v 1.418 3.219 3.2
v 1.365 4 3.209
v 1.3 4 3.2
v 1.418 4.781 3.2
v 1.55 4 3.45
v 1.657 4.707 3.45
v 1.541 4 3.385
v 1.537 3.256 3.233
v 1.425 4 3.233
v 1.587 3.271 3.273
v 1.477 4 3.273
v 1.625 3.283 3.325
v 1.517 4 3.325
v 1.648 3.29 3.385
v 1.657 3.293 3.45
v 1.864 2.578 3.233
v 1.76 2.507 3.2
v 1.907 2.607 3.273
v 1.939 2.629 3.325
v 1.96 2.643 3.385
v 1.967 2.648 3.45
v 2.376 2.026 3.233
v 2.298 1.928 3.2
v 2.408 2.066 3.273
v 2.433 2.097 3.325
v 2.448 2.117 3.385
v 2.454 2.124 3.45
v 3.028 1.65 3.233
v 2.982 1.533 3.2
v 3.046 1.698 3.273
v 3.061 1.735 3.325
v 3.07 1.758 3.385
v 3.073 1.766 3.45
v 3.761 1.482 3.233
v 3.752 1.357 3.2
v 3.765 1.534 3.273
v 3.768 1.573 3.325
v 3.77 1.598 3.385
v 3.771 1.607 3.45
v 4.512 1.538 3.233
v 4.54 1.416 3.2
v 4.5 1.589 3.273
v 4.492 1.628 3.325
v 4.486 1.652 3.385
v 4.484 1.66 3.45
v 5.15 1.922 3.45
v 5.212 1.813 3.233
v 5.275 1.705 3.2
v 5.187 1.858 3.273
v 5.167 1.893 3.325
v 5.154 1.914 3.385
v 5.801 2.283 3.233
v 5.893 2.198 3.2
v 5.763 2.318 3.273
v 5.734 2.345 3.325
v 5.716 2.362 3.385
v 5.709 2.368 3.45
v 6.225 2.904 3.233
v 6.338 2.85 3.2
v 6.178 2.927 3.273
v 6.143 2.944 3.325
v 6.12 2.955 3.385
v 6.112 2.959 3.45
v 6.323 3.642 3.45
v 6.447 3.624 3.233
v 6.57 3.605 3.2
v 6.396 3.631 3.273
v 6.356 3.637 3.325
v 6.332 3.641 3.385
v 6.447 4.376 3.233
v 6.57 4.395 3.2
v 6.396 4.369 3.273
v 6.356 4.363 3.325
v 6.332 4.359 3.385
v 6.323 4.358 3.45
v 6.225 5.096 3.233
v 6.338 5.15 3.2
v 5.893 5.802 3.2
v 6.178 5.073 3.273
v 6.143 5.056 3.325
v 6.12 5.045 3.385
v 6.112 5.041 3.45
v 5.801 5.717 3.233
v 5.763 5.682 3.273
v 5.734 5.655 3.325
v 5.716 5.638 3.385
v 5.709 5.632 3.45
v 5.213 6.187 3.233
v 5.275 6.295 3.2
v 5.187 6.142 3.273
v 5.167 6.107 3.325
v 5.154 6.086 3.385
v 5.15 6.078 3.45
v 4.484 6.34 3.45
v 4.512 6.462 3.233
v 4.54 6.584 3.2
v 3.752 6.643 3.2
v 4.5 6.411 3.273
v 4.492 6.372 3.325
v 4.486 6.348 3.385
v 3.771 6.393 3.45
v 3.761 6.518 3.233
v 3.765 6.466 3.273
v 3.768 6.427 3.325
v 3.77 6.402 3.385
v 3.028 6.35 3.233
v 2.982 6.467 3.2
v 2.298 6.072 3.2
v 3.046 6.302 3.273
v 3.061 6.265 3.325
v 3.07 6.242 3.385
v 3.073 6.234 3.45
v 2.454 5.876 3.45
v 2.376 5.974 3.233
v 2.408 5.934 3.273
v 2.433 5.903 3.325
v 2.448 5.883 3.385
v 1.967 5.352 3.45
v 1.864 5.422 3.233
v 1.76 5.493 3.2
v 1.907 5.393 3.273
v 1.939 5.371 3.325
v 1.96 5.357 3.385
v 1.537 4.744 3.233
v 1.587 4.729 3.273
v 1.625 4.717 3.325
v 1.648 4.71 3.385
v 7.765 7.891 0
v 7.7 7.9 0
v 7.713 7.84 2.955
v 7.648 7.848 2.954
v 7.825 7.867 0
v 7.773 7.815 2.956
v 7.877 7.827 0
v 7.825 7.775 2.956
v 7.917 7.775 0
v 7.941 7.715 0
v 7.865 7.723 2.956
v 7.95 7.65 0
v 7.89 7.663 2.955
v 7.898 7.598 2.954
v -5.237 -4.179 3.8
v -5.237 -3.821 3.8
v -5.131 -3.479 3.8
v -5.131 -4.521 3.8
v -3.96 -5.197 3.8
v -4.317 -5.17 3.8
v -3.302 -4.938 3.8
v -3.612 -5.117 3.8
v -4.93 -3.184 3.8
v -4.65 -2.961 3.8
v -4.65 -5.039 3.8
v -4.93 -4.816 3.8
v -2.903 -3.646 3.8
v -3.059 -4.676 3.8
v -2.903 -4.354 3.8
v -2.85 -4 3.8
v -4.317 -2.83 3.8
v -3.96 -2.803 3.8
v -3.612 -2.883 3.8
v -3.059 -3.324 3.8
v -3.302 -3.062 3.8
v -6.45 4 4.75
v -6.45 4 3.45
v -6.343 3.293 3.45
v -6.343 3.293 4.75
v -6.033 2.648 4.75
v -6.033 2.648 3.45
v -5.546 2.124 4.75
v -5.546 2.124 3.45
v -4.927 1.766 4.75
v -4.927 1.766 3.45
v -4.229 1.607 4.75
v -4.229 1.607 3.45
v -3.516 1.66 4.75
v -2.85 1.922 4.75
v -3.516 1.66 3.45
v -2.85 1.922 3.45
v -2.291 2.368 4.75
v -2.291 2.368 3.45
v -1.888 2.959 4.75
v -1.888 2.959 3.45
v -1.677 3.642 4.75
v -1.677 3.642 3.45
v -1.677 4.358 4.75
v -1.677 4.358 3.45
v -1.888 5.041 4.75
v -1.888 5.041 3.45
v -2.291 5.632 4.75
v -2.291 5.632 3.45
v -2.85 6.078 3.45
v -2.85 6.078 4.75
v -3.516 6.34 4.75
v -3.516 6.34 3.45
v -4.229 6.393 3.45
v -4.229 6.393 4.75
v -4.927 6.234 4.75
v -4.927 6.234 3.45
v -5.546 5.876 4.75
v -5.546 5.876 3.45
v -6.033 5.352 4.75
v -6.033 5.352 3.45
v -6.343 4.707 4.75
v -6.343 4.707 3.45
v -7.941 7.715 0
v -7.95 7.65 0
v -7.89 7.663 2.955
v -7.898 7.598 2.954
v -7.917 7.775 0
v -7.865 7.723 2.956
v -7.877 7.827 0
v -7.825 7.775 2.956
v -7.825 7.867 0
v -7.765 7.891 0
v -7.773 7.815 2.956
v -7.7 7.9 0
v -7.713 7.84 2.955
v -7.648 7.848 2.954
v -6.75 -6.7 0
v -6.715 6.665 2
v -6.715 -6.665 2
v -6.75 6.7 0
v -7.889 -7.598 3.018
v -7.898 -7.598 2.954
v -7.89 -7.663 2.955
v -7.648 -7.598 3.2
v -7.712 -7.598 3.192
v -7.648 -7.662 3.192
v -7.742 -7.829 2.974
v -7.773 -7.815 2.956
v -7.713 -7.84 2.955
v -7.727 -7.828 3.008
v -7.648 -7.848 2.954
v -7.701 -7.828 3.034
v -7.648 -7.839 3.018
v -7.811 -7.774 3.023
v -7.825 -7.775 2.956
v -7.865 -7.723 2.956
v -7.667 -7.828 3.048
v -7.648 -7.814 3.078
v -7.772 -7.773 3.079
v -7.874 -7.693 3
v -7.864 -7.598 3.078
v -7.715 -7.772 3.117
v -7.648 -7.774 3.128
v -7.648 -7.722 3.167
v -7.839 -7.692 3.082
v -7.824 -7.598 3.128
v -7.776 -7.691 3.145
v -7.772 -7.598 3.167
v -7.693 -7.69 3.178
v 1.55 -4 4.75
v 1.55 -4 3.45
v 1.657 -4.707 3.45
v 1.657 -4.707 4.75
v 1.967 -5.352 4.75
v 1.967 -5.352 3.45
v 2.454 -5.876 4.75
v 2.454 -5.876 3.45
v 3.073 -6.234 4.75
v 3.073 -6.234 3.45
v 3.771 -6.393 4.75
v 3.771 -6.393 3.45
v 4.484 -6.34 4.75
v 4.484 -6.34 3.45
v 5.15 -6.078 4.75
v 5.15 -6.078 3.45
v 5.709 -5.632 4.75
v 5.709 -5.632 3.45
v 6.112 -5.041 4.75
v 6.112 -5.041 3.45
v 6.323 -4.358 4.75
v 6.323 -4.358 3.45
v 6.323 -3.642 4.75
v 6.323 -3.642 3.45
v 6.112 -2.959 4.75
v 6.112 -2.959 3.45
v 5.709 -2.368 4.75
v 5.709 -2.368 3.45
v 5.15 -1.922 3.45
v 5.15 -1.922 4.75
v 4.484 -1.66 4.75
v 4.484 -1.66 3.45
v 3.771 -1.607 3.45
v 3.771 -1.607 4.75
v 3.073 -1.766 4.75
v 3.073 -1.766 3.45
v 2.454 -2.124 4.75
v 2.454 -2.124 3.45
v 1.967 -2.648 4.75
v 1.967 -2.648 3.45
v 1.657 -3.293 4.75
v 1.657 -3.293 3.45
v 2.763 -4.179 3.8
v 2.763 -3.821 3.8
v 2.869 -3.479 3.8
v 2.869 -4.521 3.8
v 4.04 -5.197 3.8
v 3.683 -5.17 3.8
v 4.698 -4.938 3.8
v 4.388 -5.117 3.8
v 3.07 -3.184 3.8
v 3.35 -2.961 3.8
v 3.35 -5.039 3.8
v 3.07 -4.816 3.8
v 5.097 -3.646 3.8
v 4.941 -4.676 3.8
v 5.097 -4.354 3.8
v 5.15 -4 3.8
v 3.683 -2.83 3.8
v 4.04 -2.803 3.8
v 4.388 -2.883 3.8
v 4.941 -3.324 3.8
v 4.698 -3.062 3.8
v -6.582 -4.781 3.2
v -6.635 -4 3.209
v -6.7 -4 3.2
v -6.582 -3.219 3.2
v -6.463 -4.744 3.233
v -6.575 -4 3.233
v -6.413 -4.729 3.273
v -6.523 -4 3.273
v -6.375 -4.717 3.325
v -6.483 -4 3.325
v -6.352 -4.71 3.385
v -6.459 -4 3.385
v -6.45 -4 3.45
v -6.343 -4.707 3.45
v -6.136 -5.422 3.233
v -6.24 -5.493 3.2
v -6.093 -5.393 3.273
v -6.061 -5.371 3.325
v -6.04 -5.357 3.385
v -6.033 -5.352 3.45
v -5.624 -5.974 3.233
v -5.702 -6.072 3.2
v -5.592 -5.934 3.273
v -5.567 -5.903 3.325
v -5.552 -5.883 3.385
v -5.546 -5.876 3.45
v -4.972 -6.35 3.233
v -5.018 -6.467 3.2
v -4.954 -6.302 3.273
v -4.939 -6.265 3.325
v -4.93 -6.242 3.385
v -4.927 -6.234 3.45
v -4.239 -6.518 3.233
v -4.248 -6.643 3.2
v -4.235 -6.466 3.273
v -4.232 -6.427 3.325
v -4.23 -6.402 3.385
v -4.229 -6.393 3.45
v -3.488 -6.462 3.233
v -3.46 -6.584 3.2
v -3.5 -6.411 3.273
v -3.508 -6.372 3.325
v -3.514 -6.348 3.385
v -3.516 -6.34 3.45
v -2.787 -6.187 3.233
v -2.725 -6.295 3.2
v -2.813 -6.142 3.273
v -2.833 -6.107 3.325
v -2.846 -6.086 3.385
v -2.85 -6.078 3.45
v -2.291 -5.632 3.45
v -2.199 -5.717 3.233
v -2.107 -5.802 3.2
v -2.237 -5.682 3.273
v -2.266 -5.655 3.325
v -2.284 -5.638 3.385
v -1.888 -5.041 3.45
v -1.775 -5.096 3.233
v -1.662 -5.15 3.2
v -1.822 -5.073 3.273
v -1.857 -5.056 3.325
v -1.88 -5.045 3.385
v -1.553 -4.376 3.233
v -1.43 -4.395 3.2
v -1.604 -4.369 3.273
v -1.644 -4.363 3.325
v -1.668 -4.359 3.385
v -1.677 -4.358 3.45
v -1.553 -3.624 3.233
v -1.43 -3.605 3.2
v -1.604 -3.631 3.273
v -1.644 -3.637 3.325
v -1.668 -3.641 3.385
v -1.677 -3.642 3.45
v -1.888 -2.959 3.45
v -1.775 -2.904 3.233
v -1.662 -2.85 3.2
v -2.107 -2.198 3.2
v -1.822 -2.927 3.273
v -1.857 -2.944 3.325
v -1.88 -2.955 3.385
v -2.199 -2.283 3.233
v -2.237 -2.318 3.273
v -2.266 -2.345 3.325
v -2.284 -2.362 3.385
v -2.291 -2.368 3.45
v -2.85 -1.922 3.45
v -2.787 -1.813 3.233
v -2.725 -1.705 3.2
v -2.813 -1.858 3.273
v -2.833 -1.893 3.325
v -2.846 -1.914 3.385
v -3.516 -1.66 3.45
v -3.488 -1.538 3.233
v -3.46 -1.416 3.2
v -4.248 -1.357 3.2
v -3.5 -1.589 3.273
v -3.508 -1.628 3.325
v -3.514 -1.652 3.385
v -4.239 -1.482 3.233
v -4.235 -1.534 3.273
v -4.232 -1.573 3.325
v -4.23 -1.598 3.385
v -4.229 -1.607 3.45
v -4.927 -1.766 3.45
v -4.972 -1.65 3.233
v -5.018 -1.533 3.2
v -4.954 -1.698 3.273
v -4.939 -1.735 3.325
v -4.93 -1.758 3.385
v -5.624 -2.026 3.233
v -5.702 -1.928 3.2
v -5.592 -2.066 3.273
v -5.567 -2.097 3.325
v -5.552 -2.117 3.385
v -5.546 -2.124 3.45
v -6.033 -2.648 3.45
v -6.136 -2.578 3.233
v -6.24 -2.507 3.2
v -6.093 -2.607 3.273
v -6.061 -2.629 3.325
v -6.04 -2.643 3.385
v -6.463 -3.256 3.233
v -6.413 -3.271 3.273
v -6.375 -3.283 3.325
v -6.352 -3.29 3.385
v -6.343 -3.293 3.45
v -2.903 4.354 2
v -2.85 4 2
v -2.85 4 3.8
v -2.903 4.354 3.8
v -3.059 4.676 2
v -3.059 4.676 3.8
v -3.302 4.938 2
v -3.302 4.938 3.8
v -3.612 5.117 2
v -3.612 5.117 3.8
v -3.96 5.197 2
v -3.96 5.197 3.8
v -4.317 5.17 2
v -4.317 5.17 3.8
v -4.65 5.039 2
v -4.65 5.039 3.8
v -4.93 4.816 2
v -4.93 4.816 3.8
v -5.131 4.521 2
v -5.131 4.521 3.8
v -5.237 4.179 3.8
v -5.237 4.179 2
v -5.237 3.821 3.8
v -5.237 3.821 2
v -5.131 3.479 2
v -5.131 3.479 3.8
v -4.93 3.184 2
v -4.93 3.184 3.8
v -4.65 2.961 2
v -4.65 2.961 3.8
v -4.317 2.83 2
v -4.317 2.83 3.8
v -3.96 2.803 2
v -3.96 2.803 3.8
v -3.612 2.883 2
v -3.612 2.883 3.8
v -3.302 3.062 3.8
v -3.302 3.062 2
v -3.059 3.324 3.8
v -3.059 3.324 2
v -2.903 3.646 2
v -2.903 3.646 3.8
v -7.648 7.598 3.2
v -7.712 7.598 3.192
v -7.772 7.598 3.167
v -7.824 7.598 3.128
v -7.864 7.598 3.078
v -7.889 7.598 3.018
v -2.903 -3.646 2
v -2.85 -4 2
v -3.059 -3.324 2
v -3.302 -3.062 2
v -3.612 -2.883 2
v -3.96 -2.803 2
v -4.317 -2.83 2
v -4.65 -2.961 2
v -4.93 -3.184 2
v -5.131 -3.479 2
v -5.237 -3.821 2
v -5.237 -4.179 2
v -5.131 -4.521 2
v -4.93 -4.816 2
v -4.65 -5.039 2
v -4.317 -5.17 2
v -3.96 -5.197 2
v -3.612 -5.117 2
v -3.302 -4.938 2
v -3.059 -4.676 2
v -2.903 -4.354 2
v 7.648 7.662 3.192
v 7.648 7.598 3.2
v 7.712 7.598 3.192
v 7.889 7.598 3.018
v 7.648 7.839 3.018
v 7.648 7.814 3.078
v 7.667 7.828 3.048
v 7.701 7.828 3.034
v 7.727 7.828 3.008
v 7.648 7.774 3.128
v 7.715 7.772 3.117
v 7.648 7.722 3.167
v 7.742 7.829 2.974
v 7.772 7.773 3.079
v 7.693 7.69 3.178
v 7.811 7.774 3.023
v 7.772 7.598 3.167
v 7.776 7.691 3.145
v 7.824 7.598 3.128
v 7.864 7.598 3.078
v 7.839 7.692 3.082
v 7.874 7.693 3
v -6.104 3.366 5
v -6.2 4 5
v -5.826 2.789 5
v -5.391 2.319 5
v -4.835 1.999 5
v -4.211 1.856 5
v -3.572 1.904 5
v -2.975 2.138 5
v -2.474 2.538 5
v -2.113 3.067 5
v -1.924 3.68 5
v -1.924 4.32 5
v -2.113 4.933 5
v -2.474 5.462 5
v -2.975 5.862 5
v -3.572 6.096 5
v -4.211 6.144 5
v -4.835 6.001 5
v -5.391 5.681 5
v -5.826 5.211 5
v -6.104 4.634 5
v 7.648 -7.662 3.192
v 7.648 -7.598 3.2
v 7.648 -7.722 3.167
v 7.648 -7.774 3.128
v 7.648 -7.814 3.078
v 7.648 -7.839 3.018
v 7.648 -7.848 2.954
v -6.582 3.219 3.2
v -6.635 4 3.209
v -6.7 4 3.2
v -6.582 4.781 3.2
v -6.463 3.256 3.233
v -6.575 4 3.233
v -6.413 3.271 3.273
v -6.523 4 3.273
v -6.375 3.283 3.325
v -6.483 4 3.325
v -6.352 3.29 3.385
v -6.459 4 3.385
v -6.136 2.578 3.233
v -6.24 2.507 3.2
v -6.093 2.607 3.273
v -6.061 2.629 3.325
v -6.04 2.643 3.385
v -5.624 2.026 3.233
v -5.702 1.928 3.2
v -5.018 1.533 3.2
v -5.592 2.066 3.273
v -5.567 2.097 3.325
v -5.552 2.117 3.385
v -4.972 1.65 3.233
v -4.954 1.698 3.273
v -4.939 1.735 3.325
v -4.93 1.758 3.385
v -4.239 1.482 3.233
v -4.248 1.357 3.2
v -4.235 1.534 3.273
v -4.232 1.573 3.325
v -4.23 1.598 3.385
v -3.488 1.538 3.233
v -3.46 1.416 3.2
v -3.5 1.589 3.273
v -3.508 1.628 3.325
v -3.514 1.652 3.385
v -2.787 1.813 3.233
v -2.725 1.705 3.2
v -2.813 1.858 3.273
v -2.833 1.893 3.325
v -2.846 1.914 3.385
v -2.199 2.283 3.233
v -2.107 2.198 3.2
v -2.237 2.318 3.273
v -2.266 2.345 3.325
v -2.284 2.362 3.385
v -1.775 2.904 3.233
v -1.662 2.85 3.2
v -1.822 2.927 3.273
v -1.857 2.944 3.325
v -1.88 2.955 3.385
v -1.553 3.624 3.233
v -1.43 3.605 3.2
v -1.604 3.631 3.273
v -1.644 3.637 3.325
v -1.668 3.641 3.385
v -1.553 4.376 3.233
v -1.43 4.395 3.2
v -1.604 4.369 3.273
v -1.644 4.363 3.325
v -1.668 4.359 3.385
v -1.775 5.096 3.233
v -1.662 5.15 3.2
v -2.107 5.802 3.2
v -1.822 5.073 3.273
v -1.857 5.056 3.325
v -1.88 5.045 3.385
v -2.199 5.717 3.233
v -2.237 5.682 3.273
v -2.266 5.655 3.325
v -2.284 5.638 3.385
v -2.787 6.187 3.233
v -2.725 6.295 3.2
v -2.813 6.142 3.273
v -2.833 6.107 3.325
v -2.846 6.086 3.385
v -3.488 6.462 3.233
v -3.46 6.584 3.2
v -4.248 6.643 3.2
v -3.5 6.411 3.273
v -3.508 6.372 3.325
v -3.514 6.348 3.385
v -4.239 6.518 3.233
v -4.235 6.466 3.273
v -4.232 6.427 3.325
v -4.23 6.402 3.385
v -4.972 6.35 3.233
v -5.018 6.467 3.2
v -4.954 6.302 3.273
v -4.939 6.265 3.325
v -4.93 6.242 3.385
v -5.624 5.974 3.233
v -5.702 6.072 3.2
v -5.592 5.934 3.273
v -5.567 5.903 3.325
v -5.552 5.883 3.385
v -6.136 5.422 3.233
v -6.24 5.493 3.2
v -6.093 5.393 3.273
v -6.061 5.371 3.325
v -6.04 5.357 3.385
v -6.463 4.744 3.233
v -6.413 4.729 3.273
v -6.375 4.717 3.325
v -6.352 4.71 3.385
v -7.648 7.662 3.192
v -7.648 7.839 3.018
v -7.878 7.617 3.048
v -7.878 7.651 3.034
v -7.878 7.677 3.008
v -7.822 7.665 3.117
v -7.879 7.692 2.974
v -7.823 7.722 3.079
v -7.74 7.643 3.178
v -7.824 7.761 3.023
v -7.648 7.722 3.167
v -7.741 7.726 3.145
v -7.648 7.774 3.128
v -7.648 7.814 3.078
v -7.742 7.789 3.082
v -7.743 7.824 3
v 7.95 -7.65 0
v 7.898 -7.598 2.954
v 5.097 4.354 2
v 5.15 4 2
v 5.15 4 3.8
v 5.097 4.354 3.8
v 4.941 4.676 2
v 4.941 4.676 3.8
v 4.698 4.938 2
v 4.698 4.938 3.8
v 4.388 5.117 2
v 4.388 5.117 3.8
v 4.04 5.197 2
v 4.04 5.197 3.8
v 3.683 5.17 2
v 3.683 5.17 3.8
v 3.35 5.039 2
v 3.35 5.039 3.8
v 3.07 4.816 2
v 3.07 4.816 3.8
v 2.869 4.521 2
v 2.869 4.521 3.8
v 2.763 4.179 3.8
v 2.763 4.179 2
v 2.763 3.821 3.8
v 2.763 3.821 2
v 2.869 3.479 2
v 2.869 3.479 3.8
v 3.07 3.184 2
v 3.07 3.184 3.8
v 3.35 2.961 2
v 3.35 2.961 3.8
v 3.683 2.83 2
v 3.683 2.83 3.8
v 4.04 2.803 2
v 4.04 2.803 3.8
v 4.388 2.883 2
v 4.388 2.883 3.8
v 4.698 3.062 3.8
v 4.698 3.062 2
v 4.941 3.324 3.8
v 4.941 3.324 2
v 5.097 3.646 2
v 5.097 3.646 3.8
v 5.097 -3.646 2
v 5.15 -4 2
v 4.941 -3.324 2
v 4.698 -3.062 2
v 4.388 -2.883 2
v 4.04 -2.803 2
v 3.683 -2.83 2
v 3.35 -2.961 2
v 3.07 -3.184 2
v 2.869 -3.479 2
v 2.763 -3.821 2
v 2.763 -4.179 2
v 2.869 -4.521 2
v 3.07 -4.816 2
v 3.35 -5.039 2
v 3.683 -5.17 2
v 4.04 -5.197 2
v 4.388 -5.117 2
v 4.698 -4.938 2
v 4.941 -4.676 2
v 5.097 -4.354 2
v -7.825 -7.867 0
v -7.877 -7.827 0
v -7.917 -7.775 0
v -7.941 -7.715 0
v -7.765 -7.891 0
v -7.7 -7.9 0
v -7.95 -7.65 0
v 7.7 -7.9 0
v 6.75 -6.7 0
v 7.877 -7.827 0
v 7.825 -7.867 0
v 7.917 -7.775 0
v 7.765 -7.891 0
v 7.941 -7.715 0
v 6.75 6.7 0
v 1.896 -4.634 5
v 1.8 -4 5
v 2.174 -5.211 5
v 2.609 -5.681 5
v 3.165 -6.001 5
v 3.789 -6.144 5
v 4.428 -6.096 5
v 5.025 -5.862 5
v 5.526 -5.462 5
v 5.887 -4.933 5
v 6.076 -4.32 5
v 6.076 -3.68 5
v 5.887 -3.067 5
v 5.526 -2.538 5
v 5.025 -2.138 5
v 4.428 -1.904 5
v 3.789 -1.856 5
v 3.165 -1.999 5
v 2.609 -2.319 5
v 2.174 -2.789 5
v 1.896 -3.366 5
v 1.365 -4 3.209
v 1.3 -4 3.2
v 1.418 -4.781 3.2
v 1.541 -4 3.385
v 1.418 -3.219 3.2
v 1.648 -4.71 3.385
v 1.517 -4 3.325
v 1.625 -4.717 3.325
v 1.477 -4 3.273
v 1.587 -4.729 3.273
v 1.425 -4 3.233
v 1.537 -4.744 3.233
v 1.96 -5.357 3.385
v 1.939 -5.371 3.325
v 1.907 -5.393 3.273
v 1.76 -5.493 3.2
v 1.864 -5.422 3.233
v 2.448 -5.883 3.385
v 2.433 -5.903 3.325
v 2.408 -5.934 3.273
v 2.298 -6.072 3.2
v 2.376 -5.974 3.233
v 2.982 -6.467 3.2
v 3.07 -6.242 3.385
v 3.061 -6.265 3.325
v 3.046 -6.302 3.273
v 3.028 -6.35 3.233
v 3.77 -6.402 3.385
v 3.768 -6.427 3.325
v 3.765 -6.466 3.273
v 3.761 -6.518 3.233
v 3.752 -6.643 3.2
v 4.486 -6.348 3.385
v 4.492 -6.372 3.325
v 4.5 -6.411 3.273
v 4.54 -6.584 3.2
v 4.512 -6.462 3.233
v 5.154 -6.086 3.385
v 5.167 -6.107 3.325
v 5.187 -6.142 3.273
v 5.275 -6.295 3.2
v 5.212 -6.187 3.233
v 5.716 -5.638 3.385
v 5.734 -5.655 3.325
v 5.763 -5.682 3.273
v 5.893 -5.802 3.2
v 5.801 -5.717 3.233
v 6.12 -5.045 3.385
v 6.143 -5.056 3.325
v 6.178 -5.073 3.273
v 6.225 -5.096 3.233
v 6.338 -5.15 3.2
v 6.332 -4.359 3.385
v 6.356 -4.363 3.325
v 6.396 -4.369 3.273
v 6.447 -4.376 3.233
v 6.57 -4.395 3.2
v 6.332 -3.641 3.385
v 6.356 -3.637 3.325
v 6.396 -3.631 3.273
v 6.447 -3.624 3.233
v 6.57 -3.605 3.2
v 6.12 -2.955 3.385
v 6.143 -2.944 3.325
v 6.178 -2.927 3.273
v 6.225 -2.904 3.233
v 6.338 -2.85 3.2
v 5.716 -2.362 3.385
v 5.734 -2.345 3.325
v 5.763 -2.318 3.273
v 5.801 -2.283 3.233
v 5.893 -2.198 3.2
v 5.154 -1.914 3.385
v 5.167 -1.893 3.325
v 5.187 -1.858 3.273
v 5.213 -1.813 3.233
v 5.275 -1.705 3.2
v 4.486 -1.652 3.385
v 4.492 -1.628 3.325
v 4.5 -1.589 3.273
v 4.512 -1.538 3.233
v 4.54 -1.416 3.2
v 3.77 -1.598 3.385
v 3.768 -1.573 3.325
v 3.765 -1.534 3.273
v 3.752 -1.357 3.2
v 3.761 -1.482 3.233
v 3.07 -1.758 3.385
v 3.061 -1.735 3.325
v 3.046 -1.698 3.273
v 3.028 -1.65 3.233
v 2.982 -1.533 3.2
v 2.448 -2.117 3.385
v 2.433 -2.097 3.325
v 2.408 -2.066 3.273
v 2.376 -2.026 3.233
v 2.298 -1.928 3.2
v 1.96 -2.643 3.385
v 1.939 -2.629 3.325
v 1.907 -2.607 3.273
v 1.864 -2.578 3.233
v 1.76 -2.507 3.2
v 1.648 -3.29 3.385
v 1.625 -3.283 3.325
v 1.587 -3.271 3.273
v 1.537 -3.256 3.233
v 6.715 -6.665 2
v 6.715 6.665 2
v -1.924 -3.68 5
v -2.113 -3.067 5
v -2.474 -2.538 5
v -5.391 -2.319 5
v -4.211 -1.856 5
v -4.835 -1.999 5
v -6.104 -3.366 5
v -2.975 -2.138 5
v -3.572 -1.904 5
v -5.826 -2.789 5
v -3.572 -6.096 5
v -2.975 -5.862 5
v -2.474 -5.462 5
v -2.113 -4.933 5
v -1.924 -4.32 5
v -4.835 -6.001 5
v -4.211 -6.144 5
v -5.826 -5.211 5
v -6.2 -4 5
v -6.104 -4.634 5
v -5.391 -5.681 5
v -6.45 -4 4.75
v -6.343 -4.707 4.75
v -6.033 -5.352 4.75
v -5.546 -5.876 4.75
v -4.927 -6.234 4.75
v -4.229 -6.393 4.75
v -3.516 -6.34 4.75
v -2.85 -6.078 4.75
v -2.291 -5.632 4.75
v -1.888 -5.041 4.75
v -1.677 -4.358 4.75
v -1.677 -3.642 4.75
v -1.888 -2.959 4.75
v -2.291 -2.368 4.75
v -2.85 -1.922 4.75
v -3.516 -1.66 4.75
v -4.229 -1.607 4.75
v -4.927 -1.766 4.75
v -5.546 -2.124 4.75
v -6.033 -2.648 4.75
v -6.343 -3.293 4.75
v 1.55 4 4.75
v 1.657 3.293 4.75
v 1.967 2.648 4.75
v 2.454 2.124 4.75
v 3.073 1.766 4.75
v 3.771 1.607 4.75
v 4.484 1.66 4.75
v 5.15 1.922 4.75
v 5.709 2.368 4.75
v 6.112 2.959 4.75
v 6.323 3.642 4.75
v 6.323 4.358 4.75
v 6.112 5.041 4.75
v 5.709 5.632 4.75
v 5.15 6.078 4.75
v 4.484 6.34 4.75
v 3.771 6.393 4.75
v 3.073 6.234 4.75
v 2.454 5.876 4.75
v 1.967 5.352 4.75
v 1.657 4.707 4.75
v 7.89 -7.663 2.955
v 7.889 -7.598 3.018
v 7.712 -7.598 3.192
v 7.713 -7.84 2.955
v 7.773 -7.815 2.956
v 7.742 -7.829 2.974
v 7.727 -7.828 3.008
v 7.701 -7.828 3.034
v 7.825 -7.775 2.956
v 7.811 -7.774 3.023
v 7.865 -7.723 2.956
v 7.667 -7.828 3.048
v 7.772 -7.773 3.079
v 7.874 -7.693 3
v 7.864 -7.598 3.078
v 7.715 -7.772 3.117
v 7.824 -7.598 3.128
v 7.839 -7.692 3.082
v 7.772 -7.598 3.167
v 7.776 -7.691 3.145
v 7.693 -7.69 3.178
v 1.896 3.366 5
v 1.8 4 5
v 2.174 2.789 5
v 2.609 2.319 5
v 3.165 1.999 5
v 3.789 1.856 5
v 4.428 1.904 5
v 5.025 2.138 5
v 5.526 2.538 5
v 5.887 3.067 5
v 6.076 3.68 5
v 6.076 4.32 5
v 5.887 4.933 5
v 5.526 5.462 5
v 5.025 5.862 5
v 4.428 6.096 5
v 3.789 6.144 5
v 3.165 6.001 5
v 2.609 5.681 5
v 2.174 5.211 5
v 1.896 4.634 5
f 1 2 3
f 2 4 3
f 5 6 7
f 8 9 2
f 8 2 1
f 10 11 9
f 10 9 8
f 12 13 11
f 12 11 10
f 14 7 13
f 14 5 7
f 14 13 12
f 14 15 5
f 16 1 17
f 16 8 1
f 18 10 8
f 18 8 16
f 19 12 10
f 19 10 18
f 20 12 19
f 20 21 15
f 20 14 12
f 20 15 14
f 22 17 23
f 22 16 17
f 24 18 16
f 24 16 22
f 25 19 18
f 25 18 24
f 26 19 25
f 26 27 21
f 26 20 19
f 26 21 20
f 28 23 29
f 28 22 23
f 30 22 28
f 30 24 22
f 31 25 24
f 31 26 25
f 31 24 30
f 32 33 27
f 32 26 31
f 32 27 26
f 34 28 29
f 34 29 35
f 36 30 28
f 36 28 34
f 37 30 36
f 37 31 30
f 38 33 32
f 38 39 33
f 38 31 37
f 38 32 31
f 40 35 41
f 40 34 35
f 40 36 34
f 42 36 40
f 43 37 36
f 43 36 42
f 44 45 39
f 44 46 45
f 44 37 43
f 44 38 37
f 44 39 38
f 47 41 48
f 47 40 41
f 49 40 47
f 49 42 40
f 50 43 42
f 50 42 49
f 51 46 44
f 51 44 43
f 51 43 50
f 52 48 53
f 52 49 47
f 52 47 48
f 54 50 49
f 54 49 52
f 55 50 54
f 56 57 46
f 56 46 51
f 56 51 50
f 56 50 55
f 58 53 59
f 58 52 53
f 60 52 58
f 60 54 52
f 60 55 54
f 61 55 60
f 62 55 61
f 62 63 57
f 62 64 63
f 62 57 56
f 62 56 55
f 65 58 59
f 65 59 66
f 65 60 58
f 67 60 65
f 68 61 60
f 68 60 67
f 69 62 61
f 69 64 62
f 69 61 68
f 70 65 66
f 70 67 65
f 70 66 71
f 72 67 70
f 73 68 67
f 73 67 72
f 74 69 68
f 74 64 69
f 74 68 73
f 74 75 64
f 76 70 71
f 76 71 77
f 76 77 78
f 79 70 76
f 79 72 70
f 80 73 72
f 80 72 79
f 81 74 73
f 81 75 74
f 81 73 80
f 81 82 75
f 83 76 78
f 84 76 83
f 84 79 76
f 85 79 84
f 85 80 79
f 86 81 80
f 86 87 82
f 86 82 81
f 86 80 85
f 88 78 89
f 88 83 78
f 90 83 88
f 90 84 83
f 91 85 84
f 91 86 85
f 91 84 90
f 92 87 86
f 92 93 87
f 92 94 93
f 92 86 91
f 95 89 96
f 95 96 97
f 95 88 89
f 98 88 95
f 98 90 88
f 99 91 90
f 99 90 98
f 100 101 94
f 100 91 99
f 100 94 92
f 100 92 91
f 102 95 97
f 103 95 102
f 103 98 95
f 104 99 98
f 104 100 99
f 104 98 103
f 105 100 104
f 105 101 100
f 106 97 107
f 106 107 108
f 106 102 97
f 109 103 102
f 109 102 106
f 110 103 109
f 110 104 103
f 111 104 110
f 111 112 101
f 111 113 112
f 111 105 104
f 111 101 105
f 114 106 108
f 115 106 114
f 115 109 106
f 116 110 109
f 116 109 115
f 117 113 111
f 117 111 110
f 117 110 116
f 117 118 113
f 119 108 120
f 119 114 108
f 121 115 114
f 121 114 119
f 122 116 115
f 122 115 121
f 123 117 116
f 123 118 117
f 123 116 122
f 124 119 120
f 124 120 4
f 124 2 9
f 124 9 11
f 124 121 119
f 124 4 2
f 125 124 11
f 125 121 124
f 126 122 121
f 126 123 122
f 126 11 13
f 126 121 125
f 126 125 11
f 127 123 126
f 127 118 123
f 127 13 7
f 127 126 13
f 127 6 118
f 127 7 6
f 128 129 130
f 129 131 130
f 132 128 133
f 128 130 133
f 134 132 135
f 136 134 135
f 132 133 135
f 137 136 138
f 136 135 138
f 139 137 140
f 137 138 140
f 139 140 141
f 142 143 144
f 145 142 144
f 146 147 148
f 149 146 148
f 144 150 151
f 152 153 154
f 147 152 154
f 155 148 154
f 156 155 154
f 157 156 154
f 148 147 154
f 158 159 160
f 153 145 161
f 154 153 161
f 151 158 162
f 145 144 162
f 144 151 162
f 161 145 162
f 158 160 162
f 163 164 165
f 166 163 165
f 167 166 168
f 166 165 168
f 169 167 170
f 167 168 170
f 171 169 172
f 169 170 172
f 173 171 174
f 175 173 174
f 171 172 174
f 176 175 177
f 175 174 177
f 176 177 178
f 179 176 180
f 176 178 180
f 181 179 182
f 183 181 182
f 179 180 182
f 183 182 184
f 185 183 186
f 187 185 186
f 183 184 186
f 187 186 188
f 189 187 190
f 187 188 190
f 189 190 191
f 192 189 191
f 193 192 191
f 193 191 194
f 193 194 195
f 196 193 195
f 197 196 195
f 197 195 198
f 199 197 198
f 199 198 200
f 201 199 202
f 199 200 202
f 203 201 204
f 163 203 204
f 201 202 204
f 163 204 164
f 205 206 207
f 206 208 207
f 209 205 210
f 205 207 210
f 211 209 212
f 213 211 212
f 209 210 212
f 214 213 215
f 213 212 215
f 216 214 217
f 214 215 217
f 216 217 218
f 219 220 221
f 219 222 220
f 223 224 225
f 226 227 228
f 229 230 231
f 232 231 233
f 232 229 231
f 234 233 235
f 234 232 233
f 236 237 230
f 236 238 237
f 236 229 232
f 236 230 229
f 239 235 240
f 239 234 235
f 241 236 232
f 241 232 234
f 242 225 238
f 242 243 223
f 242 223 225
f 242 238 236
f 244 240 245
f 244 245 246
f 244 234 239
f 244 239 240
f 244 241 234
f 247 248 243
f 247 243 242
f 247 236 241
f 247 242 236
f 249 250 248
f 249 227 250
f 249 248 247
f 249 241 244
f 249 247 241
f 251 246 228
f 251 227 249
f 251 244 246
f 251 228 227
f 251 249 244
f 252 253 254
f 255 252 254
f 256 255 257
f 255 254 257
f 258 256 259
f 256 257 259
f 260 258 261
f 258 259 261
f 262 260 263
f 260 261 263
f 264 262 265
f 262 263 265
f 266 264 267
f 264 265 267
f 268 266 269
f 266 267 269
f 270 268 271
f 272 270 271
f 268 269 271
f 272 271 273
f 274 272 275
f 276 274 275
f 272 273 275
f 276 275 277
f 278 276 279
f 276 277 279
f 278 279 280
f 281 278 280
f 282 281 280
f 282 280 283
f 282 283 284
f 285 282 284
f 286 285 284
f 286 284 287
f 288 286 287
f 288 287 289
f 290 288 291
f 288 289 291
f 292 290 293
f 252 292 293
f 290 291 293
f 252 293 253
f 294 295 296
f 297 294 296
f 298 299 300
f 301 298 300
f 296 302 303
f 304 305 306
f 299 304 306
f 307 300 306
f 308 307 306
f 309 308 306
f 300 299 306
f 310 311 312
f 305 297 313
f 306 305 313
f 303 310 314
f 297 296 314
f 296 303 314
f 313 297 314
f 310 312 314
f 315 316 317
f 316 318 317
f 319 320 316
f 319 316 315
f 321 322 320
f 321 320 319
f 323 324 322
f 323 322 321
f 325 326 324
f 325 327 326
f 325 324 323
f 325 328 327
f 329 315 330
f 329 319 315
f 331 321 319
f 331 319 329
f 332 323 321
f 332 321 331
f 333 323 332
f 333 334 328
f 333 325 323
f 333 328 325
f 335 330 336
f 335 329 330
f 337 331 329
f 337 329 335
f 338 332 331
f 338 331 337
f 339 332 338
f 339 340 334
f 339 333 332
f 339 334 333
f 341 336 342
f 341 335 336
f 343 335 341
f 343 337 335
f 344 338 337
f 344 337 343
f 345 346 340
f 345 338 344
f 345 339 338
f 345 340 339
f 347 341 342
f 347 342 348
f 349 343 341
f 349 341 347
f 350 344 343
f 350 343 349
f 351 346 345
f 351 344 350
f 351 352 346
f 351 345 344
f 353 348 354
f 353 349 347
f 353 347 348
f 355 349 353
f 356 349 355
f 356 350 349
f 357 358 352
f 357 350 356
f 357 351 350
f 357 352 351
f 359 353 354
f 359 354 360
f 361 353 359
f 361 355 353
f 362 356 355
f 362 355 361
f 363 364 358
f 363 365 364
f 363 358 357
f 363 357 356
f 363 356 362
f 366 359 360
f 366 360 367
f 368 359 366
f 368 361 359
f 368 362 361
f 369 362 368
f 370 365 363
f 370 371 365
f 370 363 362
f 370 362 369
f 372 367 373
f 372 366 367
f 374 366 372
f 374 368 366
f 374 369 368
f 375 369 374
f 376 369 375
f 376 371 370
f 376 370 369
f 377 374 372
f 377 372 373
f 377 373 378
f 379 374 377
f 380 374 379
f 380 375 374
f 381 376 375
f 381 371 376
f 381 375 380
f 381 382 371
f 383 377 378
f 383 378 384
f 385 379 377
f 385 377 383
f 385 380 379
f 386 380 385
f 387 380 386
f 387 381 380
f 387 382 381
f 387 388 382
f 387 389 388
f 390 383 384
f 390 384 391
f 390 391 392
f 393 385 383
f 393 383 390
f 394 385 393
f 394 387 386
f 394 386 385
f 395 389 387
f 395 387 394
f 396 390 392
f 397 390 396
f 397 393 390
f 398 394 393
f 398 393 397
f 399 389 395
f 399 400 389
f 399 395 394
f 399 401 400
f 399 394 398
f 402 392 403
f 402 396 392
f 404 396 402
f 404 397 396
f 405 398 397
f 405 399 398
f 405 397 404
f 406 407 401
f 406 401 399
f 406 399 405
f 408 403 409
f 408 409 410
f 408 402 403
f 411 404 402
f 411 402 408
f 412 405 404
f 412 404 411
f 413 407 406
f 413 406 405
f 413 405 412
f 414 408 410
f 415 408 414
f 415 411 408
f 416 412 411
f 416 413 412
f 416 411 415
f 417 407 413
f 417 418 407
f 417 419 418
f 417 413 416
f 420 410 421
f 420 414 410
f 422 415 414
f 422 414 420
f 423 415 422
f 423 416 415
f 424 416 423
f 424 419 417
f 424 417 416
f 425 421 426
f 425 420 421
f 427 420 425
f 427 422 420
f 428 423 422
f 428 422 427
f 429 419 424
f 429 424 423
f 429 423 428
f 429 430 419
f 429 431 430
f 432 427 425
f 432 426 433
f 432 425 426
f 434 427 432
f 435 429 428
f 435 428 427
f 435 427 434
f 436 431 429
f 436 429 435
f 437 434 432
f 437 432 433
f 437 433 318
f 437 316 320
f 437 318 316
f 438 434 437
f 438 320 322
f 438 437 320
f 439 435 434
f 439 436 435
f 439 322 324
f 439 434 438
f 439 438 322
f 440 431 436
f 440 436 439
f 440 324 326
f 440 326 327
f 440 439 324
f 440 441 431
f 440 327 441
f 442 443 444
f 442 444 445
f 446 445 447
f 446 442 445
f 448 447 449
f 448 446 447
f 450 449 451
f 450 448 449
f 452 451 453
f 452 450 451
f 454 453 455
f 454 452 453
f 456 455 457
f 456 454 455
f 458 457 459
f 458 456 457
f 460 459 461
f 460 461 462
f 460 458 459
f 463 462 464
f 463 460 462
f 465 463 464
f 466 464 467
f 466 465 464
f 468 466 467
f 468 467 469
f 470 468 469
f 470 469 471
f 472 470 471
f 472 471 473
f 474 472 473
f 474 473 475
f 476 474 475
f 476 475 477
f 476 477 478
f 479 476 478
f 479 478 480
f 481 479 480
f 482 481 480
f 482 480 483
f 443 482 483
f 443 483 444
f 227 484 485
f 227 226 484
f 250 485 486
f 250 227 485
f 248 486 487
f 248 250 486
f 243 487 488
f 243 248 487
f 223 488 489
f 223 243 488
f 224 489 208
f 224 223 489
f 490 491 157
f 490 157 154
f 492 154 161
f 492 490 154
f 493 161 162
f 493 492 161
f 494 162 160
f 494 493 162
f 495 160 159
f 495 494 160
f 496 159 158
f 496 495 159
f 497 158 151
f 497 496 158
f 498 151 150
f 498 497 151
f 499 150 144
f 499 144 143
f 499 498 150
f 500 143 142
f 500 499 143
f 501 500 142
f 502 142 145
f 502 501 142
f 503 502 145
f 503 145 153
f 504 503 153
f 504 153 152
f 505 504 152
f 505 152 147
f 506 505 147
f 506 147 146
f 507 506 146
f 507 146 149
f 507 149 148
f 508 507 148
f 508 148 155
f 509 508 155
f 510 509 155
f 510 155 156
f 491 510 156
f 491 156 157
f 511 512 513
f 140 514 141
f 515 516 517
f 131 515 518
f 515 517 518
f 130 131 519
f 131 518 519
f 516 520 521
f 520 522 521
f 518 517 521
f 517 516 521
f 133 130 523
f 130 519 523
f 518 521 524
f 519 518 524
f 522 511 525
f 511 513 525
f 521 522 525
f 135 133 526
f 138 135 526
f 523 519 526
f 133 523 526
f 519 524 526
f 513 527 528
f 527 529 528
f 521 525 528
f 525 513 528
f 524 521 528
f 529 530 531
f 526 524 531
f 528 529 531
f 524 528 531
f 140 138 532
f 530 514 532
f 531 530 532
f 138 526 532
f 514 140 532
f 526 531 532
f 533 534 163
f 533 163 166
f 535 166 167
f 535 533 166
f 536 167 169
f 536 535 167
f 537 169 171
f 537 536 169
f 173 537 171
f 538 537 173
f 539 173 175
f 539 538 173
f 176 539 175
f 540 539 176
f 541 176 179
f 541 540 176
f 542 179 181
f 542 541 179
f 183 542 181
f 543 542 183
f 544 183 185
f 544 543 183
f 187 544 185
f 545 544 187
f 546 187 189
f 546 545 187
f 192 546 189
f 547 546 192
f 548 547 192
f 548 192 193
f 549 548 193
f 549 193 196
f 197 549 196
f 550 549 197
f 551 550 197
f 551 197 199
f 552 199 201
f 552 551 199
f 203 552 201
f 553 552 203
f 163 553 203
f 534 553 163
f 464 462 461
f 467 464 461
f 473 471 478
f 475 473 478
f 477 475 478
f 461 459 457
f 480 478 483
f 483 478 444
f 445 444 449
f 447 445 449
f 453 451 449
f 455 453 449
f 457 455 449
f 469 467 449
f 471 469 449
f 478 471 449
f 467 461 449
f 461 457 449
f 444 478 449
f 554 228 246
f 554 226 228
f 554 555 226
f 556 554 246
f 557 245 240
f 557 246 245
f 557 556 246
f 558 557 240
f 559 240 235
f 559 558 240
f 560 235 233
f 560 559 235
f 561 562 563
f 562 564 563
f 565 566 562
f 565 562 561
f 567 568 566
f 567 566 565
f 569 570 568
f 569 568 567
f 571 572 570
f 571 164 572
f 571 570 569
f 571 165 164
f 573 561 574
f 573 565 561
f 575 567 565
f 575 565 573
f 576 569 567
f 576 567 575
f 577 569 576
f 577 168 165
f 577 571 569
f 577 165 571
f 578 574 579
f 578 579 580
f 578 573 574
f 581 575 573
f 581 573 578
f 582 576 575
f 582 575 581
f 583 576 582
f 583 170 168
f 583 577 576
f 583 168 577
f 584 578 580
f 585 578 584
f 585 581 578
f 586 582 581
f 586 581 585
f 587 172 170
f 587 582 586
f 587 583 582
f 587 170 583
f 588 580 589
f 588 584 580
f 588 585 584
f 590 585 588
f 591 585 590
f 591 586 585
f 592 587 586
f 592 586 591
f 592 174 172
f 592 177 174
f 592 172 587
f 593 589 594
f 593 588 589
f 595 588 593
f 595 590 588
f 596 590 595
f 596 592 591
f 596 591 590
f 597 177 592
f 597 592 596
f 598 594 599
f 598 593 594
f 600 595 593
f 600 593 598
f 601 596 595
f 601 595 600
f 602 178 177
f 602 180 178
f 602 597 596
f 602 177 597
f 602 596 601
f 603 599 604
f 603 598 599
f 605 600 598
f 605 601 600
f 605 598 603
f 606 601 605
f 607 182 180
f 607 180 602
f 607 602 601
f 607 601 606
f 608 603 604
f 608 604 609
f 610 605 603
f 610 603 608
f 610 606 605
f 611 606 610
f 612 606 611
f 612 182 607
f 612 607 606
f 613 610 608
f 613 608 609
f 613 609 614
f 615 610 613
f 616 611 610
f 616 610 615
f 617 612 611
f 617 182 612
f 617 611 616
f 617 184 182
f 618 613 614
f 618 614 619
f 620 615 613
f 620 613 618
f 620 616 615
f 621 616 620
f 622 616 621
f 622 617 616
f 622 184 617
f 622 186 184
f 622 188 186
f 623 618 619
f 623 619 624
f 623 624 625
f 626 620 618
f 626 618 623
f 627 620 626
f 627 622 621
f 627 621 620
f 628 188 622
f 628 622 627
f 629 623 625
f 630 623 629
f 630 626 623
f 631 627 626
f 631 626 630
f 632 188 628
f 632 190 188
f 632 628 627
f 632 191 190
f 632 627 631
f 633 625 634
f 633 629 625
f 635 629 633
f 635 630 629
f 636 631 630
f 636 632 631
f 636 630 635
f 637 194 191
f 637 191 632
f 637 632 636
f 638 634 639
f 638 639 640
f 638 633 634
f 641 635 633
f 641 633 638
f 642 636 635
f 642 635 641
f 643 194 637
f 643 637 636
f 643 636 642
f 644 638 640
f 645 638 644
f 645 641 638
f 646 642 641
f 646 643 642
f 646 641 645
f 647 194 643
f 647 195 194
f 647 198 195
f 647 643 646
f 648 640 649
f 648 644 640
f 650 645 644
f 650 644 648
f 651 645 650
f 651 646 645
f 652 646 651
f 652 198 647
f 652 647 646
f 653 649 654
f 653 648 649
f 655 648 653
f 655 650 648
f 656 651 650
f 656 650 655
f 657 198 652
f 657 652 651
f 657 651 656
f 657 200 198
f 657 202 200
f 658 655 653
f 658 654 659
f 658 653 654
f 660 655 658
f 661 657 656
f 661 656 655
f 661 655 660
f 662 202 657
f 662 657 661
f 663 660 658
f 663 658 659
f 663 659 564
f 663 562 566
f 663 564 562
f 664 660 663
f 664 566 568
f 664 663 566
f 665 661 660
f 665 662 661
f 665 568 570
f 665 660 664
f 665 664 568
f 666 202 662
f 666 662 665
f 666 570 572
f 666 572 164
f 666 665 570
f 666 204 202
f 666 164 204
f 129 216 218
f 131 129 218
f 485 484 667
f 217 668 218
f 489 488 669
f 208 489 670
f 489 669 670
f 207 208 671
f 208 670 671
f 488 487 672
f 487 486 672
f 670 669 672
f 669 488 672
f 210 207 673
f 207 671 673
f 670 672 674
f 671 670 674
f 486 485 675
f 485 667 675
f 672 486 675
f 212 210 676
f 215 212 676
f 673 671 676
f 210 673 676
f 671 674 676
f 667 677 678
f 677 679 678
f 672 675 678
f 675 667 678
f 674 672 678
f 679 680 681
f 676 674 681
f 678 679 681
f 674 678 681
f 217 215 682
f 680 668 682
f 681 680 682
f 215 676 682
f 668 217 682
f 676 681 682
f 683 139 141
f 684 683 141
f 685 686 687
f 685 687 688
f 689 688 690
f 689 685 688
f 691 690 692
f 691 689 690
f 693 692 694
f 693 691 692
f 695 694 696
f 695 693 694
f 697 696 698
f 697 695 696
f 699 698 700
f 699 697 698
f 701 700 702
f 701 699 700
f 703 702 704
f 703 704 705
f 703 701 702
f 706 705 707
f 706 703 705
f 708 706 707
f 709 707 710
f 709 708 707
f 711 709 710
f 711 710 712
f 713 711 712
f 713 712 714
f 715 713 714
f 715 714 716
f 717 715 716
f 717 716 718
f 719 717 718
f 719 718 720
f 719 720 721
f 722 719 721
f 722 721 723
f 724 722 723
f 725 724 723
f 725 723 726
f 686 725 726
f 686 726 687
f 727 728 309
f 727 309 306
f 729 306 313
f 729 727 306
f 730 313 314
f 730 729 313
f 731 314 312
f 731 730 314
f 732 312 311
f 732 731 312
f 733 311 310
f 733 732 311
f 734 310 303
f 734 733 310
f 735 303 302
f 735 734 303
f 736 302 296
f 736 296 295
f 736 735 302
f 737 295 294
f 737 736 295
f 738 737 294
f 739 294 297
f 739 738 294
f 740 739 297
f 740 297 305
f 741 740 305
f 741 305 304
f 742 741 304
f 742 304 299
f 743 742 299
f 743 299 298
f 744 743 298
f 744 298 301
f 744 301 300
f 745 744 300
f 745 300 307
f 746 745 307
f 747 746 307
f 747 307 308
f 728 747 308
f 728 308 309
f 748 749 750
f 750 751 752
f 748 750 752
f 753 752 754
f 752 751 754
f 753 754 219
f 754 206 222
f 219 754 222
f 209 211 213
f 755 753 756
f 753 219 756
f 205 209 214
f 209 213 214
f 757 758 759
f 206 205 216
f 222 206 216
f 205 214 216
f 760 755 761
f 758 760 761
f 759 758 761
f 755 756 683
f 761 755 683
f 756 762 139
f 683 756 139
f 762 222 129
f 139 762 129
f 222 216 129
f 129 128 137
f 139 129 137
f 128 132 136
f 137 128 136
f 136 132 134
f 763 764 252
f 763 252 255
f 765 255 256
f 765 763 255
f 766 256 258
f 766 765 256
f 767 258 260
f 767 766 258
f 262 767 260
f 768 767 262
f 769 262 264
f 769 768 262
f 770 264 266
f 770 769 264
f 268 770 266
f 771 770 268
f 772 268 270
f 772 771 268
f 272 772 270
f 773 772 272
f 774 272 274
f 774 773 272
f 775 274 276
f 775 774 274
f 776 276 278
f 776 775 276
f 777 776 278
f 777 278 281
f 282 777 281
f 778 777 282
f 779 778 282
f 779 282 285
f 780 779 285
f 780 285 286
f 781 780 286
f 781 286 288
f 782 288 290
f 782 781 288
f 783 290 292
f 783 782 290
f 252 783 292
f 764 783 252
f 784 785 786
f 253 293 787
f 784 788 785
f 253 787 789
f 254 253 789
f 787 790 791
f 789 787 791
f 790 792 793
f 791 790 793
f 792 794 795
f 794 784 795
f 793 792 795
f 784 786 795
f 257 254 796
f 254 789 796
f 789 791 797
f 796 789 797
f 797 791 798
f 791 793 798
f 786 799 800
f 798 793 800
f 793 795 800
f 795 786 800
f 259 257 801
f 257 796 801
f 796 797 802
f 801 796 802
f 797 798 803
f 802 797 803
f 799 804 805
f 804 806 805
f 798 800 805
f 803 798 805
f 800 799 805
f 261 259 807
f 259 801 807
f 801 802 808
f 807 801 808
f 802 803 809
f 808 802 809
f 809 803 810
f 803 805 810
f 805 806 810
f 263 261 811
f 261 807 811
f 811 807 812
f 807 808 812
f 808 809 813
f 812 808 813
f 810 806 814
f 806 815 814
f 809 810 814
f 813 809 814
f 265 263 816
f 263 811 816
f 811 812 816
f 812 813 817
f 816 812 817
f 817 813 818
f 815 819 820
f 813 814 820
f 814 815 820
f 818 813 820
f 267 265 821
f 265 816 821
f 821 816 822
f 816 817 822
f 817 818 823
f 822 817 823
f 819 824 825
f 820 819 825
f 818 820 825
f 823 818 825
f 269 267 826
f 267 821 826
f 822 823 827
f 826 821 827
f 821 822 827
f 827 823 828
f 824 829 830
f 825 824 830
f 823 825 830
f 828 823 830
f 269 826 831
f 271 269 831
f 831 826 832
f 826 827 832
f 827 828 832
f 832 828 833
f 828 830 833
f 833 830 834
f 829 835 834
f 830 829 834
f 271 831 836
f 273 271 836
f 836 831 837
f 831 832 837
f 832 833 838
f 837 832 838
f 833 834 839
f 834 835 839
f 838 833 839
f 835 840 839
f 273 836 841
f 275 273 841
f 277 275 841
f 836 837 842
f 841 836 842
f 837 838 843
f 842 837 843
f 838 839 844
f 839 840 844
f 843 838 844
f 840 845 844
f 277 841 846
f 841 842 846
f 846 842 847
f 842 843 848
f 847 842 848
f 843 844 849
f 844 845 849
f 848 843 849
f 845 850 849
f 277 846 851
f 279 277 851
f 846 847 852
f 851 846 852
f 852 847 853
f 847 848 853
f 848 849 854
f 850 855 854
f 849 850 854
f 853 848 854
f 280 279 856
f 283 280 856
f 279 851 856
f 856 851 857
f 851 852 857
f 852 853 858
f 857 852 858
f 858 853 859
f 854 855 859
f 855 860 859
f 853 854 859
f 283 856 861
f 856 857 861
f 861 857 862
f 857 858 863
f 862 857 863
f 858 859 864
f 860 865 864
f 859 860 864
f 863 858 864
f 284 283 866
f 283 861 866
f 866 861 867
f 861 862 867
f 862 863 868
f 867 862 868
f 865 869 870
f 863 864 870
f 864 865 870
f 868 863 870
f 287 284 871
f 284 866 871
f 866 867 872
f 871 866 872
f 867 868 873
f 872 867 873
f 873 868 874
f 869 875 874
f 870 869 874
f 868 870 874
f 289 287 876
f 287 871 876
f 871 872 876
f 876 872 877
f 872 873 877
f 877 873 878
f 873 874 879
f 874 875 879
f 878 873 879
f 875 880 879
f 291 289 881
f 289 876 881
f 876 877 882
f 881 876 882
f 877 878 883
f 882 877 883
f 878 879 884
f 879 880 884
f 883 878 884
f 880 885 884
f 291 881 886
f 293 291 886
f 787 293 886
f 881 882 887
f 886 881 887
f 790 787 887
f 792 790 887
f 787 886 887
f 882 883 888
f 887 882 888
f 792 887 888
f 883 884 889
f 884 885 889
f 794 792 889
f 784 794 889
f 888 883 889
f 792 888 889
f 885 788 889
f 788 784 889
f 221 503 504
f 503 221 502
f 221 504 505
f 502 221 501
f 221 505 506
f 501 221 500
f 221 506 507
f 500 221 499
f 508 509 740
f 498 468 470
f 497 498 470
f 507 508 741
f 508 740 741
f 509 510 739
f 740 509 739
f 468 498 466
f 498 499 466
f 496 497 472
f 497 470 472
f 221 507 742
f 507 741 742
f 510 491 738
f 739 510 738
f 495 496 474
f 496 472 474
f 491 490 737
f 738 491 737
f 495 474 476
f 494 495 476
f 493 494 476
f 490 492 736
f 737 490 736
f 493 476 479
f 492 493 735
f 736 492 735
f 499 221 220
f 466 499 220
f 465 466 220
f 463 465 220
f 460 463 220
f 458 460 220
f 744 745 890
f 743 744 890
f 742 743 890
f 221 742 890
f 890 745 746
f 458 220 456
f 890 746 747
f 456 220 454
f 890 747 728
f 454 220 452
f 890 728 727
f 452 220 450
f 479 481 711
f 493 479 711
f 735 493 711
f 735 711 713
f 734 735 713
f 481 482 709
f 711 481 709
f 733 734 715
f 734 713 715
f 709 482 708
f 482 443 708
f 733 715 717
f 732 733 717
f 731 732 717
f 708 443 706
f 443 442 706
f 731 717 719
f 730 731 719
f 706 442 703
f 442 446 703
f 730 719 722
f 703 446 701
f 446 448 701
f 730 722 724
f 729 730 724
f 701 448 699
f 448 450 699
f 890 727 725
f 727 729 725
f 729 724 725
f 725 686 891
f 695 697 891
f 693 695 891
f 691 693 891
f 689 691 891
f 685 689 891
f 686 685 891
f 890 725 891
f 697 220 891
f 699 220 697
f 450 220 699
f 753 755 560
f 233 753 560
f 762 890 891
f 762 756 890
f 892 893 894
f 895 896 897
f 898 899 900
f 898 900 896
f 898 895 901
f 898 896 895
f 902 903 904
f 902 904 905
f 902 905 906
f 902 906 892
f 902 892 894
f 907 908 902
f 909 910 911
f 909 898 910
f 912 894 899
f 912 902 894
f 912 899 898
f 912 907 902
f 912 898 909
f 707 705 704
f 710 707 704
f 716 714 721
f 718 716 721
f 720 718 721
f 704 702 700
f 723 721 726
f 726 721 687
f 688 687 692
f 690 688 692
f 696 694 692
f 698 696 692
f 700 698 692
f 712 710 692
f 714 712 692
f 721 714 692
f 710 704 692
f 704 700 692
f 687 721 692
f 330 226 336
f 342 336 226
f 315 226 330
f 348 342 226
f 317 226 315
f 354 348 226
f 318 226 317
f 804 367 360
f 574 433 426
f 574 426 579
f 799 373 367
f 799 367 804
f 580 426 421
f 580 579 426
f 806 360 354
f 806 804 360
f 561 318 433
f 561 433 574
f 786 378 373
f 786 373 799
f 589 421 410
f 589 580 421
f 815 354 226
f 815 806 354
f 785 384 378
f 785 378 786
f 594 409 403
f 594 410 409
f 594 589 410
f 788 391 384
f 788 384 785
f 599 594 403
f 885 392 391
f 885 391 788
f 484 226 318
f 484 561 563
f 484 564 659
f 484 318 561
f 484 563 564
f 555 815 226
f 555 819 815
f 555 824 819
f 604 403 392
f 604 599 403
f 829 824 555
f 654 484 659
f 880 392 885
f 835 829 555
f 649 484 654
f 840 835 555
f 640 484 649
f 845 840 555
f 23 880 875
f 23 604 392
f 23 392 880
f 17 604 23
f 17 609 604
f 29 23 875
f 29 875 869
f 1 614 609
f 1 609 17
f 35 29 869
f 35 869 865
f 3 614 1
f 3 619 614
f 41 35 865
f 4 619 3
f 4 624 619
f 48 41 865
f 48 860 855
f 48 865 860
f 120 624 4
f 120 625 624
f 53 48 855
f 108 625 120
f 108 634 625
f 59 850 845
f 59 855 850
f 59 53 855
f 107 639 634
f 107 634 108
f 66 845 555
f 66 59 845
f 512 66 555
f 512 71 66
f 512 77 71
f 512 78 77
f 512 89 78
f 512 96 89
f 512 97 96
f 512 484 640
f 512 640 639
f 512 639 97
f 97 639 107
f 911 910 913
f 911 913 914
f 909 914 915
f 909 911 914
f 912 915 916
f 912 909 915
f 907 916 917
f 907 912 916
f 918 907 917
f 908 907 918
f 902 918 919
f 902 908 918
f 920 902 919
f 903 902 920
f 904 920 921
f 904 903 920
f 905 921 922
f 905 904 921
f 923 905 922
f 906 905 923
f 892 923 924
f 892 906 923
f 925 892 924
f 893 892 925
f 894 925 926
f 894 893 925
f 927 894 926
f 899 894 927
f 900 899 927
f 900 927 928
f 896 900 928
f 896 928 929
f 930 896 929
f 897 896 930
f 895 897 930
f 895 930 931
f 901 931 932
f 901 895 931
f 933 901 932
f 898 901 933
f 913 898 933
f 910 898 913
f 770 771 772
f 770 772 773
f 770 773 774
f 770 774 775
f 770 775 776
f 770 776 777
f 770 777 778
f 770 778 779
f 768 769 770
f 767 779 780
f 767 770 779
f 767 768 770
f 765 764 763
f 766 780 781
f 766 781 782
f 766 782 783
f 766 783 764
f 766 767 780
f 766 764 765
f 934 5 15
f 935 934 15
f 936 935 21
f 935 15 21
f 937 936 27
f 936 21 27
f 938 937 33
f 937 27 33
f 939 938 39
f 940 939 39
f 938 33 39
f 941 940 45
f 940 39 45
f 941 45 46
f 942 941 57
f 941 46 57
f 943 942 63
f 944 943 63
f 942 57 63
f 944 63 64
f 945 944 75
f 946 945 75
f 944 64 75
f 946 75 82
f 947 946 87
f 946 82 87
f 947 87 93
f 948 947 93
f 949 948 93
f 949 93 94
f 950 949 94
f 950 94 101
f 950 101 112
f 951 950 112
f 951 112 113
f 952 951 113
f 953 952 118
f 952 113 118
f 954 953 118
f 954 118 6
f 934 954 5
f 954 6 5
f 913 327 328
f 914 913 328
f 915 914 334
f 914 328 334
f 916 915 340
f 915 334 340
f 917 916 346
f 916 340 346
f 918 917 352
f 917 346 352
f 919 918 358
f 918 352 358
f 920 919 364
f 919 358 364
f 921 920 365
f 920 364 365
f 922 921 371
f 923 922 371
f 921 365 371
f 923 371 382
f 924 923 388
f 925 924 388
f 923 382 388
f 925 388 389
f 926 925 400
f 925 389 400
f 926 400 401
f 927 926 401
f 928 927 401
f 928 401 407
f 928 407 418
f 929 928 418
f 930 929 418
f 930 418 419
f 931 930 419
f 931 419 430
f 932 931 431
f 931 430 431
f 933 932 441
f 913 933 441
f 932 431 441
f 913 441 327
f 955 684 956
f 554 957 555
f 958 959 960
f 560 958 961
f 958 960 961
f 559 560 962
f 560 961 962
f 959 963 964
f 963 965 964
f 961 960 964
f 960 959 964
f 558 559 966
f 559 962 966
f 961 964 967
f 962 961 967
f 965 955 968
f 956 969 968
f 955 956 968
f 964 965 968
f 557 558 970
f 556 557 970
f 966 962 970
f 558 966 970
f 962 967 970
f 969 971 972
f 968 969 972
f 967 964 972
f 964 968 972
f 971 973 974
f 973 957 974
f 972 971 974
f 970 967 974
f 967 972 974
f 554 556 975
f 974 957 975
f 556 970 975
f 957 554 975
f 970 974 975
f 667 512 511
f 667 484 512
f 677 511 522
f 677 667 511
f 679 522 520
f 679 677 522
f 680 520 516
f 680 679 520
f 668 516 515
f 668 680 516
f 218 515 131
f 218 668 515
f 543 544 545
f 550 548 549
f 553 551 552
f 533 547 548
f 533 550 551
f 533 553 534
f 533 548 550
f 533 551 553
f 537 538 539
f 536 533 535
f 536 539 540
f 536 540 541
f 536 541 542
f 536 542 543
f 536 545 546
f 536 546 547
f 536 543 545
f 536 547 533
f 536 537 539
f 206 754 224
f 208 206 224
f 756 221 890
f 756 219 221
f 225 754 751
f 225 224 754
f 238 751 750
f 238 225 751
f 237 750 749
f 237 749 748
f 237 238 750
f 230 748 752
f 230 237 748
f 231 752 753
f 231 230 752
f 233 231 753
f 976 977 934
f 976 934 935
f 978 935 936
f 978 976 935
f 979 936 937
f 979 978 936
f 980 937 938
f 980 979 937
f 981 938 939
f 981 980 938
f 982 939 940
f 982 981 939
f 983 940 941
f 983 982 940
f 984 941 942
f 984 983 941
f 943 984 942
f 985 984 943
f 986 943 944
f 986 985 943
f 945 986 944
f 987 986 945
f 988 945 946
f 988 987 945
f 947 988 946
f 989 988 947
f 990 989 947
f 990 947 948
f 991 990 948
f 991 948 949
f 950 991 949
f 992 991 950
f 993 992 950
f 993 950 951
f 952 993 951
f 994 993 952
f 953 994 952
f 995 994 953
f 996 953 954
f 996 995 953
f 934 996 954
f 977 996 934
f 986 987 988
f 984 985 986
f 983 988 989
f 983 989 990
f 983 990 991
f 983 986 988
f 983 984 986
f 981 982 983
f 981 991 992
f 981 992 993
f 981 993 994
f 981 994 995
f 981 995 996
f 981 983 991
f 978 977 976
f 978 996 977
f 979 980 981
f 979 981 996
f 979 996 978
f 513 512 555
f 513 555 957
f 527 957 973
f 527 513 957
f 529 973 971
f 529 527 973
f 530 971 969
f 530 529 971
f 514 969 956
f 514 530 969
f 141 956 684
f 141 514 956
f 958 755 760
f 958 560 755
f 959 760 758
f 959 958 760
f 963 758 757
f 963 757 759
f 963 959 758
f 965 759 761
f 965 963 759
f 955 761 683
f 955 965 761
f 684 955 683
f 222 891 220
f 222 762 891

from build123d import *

# Parameters (mm, degrees)
SKETCH1_W                  = 15.9
SKETCH1_H                  = 15.8
BOSS_EXTRUDE1_DEPTH        = 3.2
BOSS_EXTRUDE1_TAPER        = 1
SKETCH2_R                  = 2.4
BOSS_EXTRUDE2_DEPTH        = 1.8
CHAMFER3_SIZE              = 0.25
LPATTERN2_COUNT            = 2
LPATTERN2_PITCH            = 8
LPATTERN2_COUNT_DIR2       = 2
LPATTERN2_PITCH_DIR2       = 8
CHAMFER3_OF_LPATTERN2_SIZE = 0.25
SHELL1_OUTLINE_R           = 1.2
SHELL1_DEPTH               = 3.8
FILLET2_R                  = 0.25


with BuildPart() as part:
    # Sketch1 → Boss-Extrude1 (new body)
    with BuildSketch(Plane.XY):
        Rectangle(SKETCH1_W, SKETCH1_H)
    extrude(amount=BOSS_EXTRUDE1_DEPTH, taper=BOSS_EXTRUDE1_TAPER)

    # Sketch2 → Boss-Extrude2 (add)
    with BuildSketch(Plane.XY.offset(3.2)):
        with Locations(Location((-4.05, -4, 0), (0, 0, 180))):
            Circle(SKETCH2_R)
    boss_extrude2 = extrude(amount=BOSS_EXTRUDE2_DEPTH)

    # Chamfer3
    chamfer3_edges = [part.edges().sort_by_distance(p)[0] for p in [
        (-1.65, -4, 5),
    ]]
    chamfer(chamfer3_edges, length=CHAMFER3_SIZE)

    # LPattern2: Boss-Extrude2 2 × 2
    with Locations(*[(j * LPATTERN2_PITCH_DIR2, i * LPATTERN2_PITCH, 0) for i in range(LPATTERN2_COUNT) for j in range(LPATTERN2_COUNT_DIR2) if (i, j) != (0, 0)]):
        add(boss_extrude2)

    # Chamfer3 of LPattern2
    chamfer3_of_lpattern2_edges = [part.edges().sort_by_distance(p)[0] for p in [
        (6.35, -4, 5),
        (-1.65, 4, 5),
        (6.35, 4, 5),
    ]]
    chamfer(chamfer3_of_lpattern2_edges, length=CHAMFER3_OF_LPATTERN2_SIZE)

    # Shell1: read off the stored shape, not the designer's step
    # Shell1 outline → Shell1 (cut)
    with BuildSketch(Plane.XY):
        with Locations((3.95, 4)):
            Circle(SHELL1_OUTLINE_R)
        with Locations((3.95, -4)):
            Circle(SHELL1_OUTLINE_R)
        with Locations((-4.05, -4)):
            Circle(SHELL1_OUTLINE_R)
        with Locations((-4.05, 4)):
            Circle(SHELL1_OUTLINE_R)
    extrude(amount=SHELL1_DEPTH, mode=Mode.SUBTRACT)

    # Shell1 2: loft between two sections, ruled curve by curve
    shell1_2_from = [
        Edge.make_line((-6.714907076, 6.664907076, 2), (-6.714907076, -6.664907076, 2)),
        Edge.make_line((-6.714907076, -6.664907076, 2), (6.714907076, -6.664907076, 2)),
        Edge.make_line((6.714907076, -6.664907076, 2), (6.714907076, 6.664907076, 2)),
        Edge.make_line((6.714907076, 6.664907076, 2), (-6.714907076, 6.664907076, 2)),
    ]
    shell1_2_to = [
        Edge.make_line((-6.749817206, 6.699817206, 0), (-6.749817206, -6.699817206, 0)),
        Edge.make_line((-6.749817206, -6.699817206, 0), (6.749817206, -6.699817206, 0)),
        Edge.make_line((6.749817206, -6.699817206, 0), (6.749817206, 6.699817206, 0)),
        Edge.make_line((6.749817206, 6.699817206, 0), (-6.749817206, 6.699817206, 0)),
    ]
    shell1_2 = Solid(Shell([*[Face.make_surface_from_curves(shell1_2_from[k], shell1_2_to[k]) for k in range(4)], Face(Wire(shell1_2_from)), Face(Wire(shell1_2_to))]))
    add(shell1_2, mode=Mode.SUBTRACT)

    # Fillet2
    fillet2_edges = [part.edges().sort_by_distance(p)[0] for p in [
        (7.894143792, 0, 3.2),
        (0, 7.844143792, 3.2),
        (-1.65, -4, 3.2),
        (-1.65, 4, 3.2),
        (6.35, -4, 3.2),
        (6.35, 4, 3.2),
        (-7.894143792, 0, 3.2),
        (-7.922071434, 7.872071434, 1.600026465),
        (7.922071896, 7.872071896, 1.6),
        (7.922071434, -7.872071434, 1.600026465),
        (-7.922071896, -7.872071896, 1.6),
        (0, -7.844143792, 3.2),
    ]]
    fillet(fillet2_edges, radius=FILLET2_R)


solid = part.part
